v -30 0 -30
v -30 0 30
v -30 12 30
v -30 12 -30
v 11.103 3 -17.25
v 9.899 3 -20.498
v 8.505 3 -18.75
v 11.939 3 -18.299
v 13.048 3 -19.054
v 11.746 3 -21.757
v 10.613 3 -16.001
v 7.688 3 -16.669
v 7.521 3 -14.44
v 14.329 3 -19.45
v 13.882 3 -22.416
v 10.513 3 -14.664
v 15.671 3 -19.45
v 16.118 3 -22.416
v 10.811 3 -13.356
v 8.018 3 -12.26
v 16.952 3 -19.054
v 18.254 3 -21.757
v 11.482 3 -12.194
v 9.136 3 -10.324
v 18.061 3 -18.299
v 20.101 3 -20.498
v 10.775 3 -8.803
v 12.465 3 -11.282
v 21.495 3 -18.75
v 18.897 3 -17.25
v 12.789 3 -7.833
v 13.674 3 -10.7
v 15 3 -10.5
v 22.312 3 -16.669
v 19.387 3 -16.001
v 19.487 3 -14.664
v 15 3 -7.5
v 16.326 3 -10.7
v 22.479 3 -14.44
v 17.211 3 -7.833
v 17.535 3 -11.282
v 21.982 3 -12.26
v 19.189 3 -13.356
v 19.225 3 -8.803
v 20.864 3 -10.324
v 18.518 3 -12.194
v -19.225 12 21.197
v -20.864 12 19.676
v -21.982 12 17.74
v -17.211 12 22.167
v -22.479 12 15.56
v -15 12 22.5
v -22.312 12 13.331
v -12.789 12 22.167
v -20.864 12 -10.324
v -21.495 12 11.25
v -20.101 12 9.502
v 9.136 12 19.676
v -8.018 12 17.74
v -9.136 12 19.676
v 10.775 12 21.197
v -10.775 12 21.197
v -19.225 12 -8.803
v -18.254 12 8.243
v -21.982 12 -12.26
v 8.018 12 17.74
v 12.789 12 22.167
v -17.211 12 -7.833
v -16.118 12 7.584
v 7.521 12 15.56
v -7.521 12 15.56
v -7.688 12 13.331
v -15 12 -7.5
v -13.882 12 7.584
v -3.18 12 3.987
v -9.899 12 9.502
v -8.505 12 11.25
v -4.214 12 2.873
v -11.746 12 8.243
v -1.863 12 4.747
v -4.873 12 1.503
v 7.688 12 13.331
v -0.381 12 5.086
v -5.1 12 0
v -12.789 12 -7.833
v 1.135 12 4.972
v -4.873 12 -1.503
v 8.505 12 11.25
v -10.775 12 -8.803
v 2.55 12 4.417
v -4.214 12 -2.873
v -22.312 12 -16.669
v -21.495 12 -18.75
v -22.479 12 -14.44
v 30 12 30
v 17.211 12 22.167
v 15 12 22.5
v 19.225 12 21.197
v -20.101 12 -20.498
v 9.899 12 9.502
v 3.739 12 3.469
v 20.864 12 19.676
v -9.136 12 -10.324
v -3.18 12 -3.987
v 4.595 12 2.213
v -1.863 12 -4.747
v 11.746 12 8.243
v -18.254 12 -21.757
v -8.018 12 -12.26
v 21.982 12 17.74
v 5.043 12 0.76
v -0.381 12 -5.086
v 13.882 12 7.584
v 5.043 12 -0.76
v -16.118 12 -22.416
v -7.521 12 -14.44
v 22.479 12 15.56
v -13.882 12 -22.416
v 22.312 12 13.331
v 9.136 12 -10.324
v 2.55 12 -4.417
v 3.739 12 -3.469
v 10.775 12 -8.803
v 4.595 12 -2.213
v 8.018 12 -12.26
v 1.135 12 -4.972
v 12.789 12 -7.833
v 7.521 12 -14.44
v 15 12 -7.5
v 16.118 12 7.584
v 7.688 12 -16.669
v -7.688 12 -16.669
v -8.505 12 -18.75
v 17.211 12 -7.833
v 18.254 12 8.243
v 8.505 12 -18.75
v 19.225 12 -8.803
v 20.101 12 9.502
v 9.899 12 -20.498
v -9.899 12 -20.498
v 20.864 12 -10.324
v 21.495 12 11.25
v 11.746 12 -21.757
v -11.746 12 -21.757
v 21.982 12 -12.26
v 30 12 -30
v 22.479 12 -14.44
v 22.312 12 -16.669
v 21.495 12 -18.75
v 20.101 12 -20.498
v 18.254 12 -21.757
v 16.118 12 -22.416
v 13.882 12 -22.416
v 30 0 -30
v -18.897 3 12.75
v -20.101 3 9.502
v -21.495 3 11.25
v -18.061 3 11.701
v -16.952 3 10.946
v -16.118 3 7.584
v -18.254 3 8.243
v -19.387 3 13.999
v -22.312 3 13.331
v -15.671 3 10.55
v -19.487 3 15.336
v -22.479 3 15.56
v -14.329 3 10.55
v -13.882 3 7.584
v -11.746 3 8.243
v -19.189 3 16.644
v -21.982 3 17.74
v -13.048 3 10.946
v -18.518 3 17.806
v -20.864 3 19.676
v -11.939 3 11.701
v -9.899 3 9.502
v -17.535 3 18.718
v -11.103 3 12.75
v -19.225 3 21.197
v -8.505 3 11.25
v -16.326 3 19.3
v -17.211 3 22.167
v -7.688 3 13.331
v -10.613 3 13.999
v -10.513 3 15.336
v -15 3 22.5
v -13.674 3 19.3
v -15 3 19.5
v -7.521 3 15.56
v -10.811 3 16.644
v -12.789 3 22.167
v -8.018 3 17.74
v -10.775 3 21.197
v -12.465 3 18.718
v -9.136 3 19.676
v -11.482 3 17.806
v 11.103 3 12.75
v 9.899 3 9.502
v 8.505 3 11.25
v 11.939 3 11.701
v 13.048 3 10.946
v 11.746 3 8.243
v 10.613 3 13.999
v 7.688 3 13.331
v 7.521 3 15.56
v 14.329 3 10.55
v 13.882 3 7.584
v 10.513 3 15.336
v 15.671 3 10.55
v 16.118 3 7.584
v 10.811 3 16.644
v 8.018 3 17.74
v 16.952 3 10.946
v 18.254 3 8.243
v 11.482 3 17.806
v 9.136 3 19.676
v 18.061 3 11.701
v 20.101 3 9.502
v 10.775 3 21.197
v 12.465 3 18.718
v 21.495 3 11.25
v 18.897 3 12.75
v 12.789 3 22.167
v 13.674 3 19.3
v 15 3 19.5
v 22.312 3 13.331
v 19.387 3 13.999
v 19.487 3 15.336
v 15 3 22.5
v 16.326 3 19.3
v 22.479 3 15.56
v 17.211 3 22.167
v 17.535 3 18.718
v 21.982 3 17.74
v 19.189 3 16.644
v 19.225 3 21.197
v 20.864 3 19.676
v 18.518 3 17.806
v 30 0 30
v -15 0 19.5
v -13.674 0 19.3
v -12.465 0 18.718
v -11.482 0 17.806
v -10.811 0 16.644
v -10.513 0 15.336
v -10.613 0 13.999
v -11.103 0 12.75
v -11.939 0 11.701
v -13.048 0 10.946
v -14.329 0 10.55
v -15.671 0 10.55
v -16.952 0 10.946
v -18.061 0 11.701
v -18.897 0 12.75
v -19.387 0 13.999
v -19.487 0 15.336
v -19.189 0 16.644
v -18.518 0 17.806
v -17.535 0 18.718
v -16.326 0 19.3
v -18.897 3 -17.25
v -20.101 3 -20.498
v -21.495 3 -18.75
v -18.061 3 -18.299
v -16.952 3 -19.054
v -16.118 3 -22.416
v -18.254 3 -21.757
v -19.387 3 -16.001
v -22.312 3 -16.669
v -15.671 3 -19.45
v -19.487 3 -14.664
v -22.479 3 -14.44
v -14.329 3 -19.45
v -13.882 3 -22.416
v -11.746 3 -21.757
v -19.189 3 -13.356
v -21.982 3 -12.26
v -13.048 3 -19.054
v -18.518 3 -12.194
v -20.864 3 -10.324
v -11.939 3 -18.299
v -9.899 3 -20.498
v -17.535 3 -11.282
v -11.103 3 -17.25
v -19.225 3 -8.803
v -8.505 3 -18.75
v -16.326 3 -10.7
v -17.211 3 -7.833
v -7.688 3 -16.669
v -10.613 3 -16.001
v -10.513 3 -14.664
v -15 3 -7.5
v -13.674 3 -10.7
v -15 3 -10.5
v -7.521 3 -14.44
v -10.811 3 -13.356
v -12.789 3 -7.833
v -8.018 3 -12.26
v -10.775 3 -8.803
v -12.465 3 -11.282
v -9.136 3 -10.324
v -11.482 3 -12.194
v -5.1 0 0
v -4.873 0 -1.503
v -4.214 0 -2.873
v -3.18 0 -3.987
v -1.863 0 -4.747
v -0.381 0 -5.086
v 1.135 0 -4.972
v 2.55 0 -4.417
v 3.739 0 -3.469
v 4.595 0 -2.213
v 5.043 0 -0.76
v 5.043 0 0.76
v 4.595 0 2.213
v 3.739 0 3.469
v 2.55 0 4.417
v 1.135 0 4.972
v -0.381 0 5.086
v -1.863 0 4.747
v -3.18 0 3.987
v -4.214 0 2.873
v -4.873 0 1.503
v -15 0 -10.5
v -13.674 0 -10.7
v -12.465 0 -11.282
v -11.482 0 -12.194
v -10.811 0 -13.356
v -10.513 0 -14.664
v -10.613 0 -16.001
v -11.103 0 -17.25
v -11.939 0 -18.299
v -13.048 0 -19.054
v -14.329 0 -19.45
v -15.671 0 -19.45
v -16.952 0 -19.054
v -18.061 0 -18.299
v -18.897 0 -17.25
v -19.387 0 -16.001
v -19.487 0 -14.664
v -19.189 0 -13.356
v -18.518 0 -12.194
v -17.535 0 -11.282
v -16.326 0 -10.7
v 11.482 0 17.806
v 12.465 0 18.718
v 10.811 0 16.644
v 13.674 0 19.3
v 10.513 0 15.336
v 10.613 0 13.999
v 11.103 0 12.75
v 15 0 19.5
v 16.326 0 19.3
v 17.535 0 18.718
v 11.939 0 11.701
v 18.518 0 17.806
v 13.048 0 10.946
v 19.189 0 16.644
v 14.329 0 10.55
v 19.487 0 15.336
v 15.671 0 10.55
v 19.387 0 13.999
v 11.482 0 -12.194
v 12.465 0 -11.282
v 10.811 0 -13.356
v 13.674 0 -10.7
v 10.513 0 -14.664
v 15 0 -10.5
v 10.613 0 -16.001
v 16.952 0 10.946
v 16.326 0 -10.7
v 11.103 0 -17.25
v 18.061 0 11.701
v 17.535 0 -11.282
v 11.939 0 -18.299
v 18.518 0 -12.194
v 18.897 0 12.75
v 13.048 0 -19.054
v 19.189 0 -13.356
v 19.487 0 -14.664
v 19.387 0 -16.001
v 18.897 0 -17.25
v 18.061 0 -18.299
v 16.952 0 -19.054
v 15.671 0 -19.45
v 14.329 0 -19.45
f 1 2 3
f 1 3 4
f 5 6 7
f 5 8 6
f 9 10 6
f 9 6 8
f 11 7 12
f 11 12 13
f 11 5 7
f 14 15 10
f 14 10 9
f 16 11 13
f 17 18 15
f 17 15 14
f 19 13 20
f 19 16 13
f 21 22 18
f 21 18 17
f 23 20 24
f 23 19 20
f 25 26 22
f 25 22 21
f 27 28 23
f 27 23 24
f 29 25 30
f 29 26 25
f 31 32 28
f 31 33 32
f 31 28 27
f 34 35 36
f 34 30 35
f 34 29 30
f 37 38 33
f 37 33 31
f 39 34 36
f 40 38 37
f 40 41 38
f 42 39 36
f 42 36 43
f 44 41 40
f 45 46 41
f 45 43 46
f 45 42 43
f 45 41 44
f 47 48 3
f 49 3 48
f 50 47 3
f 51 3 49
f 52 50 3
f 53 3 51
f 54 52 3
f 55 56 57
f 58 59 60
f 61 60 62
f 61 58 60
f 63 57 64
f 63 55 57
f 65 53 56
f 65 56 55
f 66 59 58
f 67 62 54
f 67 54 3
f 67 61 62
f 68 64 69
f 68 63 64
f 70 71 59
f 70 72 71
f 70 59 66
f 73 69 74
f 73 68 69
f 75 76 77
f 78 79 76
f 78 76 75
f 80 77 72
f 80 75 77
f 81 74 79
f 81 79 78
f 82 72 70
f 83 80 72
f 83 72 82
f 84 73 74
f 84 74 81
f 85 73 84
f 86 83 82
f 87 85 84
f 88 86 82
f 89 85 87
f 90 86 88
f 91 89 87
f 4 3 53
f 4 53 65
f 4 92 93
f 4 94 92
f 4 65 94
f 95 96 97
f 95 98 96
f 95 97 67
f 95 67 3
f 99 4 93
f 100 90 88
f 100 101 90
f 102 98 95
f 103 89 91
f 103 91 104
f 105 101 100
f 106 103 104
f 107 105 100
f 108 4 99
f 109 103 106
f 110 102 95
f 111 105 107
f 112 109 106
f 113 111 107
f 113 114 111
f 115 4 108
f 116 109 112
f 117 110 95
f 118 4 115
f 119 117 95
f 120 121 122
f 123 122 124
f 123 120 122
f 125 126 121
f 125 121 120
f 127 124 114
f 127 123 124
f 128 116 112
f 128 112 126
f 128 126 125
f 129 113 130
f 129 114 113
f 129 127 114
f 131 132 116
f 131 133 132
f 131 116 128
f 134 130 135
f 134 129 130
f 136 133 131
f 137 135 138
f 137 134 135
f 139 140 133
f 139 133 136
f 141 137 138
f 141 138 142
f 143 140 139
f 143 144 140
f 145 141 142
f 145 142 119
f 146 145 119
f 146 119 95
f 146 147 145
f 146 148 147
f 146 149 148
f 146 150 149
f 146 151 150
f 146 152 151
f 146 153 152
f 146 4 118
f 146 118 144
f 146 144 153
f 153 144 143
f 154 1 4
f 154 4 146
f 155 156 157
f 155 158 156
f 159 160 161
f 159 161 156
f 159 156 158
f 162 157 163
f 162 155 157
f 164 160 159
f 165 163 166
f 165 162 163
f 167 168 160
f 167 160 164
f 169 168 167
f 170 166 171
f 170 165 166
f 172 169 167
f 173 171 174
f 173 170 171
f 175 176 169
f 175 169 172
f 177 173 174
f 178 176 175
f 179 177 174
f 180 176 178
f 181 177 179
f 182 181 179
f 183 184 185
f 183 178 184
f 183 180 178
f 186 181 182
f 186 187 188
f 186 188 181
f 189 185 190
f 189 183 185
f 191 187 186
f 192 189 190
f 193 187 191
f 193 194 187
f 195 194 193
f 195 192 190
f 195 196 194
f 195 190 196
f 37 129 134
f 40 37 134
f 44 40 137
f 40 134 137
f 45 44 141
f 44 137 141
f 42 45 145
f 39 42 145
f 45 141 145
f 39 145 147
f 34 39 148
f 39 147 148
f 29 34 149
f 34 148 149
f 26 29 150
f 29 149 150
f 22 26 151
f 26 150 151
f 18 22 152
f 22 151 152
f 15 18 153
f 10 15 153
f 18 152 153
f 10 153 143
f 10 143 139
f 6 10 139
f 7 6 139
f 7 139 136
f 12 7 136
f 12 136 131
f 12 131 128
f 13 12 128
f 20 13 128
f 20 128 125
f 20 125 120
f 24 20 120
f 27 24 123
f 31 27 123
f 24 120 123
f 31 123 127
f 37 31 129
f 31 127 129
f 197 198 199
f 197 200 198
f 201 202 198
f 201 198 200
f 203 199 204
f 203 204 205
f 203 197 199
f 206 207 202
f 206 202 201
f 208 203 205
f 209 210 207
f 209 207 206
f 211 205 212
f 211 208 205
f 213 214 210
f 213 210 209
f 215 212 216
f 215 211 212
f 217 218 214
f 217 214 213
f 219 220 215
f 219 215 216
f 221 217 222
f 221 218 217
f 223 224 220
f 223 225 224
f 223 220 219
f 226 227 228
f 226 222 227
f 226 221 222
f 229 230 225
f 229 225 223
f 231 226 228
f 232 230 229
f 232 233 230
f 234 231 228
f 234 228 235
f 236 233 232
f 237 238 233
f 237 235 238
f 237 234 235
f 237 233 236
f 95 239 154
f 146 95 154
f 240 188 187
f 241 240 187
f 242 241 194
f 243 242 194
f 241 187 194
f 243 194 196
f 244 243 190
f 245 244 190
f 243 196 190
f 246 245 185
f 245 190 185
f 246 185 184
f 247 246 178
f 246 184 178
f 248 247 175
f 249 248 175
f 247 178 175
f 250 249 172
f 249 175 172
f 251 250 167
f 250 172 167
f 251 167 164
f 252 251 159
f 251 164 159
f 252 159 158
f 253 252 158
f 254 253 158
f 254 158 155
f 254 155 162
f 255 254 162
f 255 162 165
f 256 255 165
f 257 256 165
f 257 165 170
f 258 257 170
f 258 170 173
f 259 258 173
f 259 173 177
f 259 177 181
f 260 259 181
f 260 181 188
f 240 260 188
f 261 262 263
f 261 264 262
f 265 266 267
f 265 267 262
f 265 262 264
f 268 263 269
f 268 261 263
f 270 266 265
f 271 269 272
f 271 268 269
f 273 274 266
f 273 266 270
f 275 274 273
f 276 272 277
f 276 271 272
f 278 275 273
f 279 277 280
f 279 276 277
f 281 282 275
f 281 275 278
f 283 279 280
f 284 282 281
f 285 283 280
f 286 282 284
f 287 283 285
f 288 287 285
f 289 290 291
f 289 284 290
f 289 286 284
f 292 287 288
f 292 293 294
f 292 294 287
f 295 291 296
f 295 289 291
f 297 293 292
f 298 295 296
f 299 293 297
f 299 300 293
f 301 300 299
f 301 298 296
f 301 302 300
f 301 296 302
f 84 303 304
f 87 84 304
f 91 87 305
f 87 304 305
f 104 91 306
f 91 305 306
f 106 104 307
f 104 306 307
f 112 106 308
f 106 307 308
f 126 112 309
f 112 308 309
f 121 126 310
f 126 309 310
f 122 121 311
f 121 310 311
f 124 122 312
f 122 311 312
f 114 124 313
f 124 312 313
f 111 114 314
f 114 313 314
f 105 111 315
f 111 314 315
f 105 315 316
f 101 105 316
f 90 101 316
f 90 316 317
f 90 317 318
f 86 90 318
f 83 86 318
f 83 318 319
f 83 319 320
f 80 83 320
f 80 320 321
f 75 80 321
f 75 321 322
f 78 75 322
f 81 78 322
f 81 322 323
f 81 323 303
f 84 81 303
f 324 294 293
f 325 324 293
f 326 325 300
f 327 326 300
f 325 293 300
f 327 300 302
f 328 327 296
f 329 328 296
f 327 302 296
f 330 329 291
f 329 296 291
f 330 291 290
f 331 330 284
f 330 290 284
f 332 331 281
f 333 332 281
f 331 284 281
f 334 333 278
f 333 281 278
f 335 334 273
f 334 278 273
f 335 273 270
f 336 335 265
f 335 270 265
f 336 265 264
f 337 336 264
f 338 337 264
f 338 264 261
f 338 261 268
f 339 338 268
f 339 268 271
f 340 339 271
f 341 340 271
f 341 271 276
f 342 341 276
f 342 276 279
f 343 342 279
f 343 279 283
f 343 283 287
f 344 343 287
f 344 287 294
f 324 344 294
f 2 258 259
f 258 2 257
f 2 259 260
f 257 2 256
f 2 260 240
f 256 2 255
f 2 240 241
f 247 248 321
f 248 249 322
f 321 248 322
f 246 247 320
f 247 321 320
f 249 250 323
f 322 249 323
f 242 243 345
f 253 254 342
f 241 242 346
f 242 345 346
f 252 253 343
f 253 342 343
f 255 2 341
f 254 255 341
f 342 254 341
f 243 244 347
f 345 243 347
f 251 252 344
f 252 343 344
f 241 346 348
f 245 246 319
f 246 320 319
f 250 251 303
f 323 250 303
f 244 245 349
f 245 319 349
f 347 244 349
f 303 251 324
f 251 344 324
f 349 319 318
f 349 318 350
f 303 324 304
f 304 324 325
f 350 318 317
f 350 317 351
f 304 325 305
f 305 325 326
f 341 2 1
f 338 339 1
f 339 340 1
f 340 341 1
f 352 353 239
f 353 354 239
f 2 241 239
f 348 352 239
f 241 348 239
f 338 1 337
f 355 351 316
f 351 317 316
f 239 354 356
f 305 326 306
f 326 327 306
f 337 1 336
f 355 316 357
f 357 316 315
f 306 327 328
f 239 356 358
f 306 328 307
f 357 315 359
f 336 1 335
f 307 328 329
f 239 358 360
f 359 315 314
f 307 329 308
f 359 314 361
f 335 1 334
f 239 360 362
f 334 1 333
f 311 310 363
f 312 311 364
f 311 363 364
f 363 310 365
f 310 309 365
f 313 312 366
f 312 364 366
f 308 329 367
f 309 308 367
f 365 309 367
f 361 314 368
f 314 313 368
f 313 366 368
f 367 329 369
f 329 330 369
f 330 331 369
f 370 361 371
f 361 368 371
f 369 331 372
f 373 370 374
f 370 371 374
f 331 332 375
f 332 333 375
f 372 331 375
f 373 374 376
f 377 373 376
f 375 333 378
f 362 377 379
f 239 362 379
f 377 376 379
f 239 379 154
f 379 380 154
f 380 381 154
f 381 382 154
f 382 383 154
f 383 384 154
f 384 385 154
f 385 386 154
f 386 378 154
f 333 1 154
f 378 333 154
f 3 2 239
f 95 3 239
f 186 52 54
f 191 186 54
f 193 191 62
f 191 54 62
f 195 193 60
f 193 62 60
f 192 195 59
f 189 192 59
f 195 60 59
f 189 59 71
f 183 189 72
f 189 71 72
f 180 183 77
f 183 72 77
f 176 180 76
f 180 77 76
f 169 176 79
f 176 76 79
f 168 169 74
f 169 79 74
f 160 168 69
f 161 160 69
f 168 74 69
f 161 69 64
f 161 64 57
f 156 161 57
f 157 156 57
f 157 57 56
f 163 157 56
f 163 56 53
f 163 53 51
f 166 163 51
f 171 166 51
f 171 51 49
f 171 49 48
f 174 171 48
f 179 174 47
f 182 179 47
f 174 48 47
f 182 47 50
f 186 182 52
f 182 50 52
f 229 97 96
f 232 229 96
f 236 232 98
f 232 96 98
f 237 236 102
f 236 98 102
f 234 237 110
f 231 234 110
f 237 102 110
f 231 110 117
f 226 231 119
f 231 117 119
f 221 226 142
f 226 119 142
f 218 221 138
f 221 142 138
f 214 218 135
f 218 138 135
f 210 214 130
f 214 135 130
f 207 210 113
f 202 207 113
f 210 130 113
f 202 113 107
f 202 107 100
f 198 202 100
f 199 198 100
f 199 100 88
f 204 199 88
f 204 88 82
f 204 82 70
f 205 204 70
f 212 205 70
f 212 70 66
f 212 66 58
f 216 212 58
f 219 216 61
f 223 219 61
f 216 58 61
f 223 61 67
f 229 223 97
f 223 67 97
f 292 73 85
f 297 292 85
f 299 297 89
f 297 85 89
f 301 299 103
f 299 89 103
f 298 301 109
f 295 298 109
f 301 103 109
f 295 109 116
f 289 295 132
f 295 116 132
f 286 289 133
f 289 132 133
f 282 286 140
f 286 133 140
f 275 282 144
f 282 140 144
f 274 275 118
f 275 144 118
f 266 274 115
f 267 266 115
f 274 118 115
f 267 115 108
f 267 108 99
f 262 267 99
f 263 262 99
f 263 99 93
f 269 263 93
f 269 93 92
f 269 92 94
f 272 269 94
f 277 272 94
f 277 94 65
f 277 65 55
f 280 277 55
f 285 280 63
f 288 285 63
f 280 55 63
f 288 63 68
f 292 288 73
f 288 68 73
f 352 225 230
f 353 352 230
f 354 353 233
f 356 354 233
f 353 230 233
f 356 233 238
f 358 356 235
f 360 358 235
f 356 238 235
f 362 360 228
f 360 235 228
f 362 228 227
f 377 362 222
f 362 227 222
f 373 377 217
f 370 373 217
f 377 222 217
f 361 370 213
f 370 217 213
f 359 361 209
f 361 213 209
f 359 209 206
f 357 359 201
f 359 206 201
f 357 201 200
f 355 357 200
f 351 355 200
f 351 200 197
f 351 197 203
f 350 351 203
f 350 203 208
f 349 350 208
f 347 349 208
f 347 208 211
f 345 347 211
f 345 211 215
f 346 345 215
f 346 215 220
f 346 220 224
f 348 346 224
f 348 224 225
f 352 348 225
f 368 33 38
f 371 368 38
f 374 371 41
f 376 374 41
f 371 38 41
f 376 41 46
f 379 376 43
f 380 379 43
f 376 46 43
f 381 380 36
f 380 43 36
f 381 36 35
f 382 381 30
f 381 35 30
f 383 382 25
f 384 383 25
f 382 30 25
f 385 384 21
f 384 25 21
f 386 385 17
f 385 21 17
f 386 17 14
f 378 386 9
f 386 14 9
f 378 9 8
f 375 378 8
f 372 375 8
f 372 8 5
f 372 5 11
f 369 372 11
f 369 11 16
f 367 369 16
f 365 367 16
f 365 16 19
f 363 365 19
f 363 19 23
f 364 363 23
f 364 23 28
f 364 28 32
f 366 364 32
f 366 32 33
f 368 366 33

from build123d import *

# Parameters (mm, degrees)
SKETCH_1_W             = 60
SKETCH_1_H             = 60
EXTRUDE_1_DEPTH        = 12
HOLE_WIZARD_M121_D     = 10.2
HOLE_WIZARD_M121_DEPTH = 12
SKETCH_12_R            = 4.5
CUT_EXTRUDE_1_DEPTH    = 13
SKETCH_13_R            = 7.5
CUT_EXTRUDE_2_DEPTH    = 9


with BuildPart() as part:
    # Эскиз1 → Бобышка-Вытянуть1 (new body)
    with BuildSketch(Plane(origin=(0, 0, 0), x_dir=(1, 0, 0), z_dir=(0, 1, 0))):
        Rectangle(SKETCH_1_W, SKETCH_1_H)
    extrude(amount=EXTRUDE_1_DEPTH)

    # Отверстие обработанное метчиком M121
    with Locations(Plane(origin=(0, 12, 0), x_dir=(1, 0, 0), z_dir=(0, 1, 0))):
        with Locations((0, 0)):
            Hole(HOLE_WIZARD_M121_D / 2, depth=HOLE_WIZARD_M121_DEPTH)

    # Эскиз12 → Вырез-Вытянуть1 (cut, through all)
    with BuildSketch(Plane(origin=(0, 12, 0), x_dir=(1, 0, 0), z_dir=(0, 1, 0))):
        with Locations(Location((-15, 15, 0), (0, 0, 270))):  # turned: the seam where the file's is
            Circle(SKETCH_12_R)
        with Locations(Location((15, 15, 0), (0, 0, 270))):  # turned: the seam where the file's is
            Circle(SKETCH_12_R)
        with Locations(Location((15, -15, 0), (0, 0, 270))):  # turned: the seam where the file's is
            Circle(SKETCH_12_R)
        with Locations(Location((-15, -15, 0), (0, 0, 270))):  # turned: the seam where the file's is
            Circle(SKETCH_12_R)
    extrude(amount=-CUT_EXTRUDE_1_DEPTH, mode=Mode.SUBTRACT)

    # Эскиз13 → Вырез-Вытянуть2 (cut)
    with BuildSketch(Plane(origin=(0, 12, 0), x_dir=(1, 0, 0), z_dir=(0, 1, 0))):
        with Locations(Location((-15, 15, 0), (0, 0, 270))):  # turned: the seam where the file's is
            Circle(SKETCH_13_R)
        with Locations(Location((15, 15, 0), (0, 0, 270))):  # turned: the seam where the file's is
            Circle(SKETCH_13_R)
        with Locations(Location((15, -15, 0), (0, 0, 270))):  # turned: the seam where the file's is
            Circle(SKETCH_13_R)
        with Locations(Location((-15, -15, 0), (0, 0, 270))):  # turned: the seam where the file's is
            Circle(SKETCH_13_R)
    extrude(amount=-CUT_EXTRUDE_2_DEPTH, mode=Mode.SUBTRACT)


solid = part.part
